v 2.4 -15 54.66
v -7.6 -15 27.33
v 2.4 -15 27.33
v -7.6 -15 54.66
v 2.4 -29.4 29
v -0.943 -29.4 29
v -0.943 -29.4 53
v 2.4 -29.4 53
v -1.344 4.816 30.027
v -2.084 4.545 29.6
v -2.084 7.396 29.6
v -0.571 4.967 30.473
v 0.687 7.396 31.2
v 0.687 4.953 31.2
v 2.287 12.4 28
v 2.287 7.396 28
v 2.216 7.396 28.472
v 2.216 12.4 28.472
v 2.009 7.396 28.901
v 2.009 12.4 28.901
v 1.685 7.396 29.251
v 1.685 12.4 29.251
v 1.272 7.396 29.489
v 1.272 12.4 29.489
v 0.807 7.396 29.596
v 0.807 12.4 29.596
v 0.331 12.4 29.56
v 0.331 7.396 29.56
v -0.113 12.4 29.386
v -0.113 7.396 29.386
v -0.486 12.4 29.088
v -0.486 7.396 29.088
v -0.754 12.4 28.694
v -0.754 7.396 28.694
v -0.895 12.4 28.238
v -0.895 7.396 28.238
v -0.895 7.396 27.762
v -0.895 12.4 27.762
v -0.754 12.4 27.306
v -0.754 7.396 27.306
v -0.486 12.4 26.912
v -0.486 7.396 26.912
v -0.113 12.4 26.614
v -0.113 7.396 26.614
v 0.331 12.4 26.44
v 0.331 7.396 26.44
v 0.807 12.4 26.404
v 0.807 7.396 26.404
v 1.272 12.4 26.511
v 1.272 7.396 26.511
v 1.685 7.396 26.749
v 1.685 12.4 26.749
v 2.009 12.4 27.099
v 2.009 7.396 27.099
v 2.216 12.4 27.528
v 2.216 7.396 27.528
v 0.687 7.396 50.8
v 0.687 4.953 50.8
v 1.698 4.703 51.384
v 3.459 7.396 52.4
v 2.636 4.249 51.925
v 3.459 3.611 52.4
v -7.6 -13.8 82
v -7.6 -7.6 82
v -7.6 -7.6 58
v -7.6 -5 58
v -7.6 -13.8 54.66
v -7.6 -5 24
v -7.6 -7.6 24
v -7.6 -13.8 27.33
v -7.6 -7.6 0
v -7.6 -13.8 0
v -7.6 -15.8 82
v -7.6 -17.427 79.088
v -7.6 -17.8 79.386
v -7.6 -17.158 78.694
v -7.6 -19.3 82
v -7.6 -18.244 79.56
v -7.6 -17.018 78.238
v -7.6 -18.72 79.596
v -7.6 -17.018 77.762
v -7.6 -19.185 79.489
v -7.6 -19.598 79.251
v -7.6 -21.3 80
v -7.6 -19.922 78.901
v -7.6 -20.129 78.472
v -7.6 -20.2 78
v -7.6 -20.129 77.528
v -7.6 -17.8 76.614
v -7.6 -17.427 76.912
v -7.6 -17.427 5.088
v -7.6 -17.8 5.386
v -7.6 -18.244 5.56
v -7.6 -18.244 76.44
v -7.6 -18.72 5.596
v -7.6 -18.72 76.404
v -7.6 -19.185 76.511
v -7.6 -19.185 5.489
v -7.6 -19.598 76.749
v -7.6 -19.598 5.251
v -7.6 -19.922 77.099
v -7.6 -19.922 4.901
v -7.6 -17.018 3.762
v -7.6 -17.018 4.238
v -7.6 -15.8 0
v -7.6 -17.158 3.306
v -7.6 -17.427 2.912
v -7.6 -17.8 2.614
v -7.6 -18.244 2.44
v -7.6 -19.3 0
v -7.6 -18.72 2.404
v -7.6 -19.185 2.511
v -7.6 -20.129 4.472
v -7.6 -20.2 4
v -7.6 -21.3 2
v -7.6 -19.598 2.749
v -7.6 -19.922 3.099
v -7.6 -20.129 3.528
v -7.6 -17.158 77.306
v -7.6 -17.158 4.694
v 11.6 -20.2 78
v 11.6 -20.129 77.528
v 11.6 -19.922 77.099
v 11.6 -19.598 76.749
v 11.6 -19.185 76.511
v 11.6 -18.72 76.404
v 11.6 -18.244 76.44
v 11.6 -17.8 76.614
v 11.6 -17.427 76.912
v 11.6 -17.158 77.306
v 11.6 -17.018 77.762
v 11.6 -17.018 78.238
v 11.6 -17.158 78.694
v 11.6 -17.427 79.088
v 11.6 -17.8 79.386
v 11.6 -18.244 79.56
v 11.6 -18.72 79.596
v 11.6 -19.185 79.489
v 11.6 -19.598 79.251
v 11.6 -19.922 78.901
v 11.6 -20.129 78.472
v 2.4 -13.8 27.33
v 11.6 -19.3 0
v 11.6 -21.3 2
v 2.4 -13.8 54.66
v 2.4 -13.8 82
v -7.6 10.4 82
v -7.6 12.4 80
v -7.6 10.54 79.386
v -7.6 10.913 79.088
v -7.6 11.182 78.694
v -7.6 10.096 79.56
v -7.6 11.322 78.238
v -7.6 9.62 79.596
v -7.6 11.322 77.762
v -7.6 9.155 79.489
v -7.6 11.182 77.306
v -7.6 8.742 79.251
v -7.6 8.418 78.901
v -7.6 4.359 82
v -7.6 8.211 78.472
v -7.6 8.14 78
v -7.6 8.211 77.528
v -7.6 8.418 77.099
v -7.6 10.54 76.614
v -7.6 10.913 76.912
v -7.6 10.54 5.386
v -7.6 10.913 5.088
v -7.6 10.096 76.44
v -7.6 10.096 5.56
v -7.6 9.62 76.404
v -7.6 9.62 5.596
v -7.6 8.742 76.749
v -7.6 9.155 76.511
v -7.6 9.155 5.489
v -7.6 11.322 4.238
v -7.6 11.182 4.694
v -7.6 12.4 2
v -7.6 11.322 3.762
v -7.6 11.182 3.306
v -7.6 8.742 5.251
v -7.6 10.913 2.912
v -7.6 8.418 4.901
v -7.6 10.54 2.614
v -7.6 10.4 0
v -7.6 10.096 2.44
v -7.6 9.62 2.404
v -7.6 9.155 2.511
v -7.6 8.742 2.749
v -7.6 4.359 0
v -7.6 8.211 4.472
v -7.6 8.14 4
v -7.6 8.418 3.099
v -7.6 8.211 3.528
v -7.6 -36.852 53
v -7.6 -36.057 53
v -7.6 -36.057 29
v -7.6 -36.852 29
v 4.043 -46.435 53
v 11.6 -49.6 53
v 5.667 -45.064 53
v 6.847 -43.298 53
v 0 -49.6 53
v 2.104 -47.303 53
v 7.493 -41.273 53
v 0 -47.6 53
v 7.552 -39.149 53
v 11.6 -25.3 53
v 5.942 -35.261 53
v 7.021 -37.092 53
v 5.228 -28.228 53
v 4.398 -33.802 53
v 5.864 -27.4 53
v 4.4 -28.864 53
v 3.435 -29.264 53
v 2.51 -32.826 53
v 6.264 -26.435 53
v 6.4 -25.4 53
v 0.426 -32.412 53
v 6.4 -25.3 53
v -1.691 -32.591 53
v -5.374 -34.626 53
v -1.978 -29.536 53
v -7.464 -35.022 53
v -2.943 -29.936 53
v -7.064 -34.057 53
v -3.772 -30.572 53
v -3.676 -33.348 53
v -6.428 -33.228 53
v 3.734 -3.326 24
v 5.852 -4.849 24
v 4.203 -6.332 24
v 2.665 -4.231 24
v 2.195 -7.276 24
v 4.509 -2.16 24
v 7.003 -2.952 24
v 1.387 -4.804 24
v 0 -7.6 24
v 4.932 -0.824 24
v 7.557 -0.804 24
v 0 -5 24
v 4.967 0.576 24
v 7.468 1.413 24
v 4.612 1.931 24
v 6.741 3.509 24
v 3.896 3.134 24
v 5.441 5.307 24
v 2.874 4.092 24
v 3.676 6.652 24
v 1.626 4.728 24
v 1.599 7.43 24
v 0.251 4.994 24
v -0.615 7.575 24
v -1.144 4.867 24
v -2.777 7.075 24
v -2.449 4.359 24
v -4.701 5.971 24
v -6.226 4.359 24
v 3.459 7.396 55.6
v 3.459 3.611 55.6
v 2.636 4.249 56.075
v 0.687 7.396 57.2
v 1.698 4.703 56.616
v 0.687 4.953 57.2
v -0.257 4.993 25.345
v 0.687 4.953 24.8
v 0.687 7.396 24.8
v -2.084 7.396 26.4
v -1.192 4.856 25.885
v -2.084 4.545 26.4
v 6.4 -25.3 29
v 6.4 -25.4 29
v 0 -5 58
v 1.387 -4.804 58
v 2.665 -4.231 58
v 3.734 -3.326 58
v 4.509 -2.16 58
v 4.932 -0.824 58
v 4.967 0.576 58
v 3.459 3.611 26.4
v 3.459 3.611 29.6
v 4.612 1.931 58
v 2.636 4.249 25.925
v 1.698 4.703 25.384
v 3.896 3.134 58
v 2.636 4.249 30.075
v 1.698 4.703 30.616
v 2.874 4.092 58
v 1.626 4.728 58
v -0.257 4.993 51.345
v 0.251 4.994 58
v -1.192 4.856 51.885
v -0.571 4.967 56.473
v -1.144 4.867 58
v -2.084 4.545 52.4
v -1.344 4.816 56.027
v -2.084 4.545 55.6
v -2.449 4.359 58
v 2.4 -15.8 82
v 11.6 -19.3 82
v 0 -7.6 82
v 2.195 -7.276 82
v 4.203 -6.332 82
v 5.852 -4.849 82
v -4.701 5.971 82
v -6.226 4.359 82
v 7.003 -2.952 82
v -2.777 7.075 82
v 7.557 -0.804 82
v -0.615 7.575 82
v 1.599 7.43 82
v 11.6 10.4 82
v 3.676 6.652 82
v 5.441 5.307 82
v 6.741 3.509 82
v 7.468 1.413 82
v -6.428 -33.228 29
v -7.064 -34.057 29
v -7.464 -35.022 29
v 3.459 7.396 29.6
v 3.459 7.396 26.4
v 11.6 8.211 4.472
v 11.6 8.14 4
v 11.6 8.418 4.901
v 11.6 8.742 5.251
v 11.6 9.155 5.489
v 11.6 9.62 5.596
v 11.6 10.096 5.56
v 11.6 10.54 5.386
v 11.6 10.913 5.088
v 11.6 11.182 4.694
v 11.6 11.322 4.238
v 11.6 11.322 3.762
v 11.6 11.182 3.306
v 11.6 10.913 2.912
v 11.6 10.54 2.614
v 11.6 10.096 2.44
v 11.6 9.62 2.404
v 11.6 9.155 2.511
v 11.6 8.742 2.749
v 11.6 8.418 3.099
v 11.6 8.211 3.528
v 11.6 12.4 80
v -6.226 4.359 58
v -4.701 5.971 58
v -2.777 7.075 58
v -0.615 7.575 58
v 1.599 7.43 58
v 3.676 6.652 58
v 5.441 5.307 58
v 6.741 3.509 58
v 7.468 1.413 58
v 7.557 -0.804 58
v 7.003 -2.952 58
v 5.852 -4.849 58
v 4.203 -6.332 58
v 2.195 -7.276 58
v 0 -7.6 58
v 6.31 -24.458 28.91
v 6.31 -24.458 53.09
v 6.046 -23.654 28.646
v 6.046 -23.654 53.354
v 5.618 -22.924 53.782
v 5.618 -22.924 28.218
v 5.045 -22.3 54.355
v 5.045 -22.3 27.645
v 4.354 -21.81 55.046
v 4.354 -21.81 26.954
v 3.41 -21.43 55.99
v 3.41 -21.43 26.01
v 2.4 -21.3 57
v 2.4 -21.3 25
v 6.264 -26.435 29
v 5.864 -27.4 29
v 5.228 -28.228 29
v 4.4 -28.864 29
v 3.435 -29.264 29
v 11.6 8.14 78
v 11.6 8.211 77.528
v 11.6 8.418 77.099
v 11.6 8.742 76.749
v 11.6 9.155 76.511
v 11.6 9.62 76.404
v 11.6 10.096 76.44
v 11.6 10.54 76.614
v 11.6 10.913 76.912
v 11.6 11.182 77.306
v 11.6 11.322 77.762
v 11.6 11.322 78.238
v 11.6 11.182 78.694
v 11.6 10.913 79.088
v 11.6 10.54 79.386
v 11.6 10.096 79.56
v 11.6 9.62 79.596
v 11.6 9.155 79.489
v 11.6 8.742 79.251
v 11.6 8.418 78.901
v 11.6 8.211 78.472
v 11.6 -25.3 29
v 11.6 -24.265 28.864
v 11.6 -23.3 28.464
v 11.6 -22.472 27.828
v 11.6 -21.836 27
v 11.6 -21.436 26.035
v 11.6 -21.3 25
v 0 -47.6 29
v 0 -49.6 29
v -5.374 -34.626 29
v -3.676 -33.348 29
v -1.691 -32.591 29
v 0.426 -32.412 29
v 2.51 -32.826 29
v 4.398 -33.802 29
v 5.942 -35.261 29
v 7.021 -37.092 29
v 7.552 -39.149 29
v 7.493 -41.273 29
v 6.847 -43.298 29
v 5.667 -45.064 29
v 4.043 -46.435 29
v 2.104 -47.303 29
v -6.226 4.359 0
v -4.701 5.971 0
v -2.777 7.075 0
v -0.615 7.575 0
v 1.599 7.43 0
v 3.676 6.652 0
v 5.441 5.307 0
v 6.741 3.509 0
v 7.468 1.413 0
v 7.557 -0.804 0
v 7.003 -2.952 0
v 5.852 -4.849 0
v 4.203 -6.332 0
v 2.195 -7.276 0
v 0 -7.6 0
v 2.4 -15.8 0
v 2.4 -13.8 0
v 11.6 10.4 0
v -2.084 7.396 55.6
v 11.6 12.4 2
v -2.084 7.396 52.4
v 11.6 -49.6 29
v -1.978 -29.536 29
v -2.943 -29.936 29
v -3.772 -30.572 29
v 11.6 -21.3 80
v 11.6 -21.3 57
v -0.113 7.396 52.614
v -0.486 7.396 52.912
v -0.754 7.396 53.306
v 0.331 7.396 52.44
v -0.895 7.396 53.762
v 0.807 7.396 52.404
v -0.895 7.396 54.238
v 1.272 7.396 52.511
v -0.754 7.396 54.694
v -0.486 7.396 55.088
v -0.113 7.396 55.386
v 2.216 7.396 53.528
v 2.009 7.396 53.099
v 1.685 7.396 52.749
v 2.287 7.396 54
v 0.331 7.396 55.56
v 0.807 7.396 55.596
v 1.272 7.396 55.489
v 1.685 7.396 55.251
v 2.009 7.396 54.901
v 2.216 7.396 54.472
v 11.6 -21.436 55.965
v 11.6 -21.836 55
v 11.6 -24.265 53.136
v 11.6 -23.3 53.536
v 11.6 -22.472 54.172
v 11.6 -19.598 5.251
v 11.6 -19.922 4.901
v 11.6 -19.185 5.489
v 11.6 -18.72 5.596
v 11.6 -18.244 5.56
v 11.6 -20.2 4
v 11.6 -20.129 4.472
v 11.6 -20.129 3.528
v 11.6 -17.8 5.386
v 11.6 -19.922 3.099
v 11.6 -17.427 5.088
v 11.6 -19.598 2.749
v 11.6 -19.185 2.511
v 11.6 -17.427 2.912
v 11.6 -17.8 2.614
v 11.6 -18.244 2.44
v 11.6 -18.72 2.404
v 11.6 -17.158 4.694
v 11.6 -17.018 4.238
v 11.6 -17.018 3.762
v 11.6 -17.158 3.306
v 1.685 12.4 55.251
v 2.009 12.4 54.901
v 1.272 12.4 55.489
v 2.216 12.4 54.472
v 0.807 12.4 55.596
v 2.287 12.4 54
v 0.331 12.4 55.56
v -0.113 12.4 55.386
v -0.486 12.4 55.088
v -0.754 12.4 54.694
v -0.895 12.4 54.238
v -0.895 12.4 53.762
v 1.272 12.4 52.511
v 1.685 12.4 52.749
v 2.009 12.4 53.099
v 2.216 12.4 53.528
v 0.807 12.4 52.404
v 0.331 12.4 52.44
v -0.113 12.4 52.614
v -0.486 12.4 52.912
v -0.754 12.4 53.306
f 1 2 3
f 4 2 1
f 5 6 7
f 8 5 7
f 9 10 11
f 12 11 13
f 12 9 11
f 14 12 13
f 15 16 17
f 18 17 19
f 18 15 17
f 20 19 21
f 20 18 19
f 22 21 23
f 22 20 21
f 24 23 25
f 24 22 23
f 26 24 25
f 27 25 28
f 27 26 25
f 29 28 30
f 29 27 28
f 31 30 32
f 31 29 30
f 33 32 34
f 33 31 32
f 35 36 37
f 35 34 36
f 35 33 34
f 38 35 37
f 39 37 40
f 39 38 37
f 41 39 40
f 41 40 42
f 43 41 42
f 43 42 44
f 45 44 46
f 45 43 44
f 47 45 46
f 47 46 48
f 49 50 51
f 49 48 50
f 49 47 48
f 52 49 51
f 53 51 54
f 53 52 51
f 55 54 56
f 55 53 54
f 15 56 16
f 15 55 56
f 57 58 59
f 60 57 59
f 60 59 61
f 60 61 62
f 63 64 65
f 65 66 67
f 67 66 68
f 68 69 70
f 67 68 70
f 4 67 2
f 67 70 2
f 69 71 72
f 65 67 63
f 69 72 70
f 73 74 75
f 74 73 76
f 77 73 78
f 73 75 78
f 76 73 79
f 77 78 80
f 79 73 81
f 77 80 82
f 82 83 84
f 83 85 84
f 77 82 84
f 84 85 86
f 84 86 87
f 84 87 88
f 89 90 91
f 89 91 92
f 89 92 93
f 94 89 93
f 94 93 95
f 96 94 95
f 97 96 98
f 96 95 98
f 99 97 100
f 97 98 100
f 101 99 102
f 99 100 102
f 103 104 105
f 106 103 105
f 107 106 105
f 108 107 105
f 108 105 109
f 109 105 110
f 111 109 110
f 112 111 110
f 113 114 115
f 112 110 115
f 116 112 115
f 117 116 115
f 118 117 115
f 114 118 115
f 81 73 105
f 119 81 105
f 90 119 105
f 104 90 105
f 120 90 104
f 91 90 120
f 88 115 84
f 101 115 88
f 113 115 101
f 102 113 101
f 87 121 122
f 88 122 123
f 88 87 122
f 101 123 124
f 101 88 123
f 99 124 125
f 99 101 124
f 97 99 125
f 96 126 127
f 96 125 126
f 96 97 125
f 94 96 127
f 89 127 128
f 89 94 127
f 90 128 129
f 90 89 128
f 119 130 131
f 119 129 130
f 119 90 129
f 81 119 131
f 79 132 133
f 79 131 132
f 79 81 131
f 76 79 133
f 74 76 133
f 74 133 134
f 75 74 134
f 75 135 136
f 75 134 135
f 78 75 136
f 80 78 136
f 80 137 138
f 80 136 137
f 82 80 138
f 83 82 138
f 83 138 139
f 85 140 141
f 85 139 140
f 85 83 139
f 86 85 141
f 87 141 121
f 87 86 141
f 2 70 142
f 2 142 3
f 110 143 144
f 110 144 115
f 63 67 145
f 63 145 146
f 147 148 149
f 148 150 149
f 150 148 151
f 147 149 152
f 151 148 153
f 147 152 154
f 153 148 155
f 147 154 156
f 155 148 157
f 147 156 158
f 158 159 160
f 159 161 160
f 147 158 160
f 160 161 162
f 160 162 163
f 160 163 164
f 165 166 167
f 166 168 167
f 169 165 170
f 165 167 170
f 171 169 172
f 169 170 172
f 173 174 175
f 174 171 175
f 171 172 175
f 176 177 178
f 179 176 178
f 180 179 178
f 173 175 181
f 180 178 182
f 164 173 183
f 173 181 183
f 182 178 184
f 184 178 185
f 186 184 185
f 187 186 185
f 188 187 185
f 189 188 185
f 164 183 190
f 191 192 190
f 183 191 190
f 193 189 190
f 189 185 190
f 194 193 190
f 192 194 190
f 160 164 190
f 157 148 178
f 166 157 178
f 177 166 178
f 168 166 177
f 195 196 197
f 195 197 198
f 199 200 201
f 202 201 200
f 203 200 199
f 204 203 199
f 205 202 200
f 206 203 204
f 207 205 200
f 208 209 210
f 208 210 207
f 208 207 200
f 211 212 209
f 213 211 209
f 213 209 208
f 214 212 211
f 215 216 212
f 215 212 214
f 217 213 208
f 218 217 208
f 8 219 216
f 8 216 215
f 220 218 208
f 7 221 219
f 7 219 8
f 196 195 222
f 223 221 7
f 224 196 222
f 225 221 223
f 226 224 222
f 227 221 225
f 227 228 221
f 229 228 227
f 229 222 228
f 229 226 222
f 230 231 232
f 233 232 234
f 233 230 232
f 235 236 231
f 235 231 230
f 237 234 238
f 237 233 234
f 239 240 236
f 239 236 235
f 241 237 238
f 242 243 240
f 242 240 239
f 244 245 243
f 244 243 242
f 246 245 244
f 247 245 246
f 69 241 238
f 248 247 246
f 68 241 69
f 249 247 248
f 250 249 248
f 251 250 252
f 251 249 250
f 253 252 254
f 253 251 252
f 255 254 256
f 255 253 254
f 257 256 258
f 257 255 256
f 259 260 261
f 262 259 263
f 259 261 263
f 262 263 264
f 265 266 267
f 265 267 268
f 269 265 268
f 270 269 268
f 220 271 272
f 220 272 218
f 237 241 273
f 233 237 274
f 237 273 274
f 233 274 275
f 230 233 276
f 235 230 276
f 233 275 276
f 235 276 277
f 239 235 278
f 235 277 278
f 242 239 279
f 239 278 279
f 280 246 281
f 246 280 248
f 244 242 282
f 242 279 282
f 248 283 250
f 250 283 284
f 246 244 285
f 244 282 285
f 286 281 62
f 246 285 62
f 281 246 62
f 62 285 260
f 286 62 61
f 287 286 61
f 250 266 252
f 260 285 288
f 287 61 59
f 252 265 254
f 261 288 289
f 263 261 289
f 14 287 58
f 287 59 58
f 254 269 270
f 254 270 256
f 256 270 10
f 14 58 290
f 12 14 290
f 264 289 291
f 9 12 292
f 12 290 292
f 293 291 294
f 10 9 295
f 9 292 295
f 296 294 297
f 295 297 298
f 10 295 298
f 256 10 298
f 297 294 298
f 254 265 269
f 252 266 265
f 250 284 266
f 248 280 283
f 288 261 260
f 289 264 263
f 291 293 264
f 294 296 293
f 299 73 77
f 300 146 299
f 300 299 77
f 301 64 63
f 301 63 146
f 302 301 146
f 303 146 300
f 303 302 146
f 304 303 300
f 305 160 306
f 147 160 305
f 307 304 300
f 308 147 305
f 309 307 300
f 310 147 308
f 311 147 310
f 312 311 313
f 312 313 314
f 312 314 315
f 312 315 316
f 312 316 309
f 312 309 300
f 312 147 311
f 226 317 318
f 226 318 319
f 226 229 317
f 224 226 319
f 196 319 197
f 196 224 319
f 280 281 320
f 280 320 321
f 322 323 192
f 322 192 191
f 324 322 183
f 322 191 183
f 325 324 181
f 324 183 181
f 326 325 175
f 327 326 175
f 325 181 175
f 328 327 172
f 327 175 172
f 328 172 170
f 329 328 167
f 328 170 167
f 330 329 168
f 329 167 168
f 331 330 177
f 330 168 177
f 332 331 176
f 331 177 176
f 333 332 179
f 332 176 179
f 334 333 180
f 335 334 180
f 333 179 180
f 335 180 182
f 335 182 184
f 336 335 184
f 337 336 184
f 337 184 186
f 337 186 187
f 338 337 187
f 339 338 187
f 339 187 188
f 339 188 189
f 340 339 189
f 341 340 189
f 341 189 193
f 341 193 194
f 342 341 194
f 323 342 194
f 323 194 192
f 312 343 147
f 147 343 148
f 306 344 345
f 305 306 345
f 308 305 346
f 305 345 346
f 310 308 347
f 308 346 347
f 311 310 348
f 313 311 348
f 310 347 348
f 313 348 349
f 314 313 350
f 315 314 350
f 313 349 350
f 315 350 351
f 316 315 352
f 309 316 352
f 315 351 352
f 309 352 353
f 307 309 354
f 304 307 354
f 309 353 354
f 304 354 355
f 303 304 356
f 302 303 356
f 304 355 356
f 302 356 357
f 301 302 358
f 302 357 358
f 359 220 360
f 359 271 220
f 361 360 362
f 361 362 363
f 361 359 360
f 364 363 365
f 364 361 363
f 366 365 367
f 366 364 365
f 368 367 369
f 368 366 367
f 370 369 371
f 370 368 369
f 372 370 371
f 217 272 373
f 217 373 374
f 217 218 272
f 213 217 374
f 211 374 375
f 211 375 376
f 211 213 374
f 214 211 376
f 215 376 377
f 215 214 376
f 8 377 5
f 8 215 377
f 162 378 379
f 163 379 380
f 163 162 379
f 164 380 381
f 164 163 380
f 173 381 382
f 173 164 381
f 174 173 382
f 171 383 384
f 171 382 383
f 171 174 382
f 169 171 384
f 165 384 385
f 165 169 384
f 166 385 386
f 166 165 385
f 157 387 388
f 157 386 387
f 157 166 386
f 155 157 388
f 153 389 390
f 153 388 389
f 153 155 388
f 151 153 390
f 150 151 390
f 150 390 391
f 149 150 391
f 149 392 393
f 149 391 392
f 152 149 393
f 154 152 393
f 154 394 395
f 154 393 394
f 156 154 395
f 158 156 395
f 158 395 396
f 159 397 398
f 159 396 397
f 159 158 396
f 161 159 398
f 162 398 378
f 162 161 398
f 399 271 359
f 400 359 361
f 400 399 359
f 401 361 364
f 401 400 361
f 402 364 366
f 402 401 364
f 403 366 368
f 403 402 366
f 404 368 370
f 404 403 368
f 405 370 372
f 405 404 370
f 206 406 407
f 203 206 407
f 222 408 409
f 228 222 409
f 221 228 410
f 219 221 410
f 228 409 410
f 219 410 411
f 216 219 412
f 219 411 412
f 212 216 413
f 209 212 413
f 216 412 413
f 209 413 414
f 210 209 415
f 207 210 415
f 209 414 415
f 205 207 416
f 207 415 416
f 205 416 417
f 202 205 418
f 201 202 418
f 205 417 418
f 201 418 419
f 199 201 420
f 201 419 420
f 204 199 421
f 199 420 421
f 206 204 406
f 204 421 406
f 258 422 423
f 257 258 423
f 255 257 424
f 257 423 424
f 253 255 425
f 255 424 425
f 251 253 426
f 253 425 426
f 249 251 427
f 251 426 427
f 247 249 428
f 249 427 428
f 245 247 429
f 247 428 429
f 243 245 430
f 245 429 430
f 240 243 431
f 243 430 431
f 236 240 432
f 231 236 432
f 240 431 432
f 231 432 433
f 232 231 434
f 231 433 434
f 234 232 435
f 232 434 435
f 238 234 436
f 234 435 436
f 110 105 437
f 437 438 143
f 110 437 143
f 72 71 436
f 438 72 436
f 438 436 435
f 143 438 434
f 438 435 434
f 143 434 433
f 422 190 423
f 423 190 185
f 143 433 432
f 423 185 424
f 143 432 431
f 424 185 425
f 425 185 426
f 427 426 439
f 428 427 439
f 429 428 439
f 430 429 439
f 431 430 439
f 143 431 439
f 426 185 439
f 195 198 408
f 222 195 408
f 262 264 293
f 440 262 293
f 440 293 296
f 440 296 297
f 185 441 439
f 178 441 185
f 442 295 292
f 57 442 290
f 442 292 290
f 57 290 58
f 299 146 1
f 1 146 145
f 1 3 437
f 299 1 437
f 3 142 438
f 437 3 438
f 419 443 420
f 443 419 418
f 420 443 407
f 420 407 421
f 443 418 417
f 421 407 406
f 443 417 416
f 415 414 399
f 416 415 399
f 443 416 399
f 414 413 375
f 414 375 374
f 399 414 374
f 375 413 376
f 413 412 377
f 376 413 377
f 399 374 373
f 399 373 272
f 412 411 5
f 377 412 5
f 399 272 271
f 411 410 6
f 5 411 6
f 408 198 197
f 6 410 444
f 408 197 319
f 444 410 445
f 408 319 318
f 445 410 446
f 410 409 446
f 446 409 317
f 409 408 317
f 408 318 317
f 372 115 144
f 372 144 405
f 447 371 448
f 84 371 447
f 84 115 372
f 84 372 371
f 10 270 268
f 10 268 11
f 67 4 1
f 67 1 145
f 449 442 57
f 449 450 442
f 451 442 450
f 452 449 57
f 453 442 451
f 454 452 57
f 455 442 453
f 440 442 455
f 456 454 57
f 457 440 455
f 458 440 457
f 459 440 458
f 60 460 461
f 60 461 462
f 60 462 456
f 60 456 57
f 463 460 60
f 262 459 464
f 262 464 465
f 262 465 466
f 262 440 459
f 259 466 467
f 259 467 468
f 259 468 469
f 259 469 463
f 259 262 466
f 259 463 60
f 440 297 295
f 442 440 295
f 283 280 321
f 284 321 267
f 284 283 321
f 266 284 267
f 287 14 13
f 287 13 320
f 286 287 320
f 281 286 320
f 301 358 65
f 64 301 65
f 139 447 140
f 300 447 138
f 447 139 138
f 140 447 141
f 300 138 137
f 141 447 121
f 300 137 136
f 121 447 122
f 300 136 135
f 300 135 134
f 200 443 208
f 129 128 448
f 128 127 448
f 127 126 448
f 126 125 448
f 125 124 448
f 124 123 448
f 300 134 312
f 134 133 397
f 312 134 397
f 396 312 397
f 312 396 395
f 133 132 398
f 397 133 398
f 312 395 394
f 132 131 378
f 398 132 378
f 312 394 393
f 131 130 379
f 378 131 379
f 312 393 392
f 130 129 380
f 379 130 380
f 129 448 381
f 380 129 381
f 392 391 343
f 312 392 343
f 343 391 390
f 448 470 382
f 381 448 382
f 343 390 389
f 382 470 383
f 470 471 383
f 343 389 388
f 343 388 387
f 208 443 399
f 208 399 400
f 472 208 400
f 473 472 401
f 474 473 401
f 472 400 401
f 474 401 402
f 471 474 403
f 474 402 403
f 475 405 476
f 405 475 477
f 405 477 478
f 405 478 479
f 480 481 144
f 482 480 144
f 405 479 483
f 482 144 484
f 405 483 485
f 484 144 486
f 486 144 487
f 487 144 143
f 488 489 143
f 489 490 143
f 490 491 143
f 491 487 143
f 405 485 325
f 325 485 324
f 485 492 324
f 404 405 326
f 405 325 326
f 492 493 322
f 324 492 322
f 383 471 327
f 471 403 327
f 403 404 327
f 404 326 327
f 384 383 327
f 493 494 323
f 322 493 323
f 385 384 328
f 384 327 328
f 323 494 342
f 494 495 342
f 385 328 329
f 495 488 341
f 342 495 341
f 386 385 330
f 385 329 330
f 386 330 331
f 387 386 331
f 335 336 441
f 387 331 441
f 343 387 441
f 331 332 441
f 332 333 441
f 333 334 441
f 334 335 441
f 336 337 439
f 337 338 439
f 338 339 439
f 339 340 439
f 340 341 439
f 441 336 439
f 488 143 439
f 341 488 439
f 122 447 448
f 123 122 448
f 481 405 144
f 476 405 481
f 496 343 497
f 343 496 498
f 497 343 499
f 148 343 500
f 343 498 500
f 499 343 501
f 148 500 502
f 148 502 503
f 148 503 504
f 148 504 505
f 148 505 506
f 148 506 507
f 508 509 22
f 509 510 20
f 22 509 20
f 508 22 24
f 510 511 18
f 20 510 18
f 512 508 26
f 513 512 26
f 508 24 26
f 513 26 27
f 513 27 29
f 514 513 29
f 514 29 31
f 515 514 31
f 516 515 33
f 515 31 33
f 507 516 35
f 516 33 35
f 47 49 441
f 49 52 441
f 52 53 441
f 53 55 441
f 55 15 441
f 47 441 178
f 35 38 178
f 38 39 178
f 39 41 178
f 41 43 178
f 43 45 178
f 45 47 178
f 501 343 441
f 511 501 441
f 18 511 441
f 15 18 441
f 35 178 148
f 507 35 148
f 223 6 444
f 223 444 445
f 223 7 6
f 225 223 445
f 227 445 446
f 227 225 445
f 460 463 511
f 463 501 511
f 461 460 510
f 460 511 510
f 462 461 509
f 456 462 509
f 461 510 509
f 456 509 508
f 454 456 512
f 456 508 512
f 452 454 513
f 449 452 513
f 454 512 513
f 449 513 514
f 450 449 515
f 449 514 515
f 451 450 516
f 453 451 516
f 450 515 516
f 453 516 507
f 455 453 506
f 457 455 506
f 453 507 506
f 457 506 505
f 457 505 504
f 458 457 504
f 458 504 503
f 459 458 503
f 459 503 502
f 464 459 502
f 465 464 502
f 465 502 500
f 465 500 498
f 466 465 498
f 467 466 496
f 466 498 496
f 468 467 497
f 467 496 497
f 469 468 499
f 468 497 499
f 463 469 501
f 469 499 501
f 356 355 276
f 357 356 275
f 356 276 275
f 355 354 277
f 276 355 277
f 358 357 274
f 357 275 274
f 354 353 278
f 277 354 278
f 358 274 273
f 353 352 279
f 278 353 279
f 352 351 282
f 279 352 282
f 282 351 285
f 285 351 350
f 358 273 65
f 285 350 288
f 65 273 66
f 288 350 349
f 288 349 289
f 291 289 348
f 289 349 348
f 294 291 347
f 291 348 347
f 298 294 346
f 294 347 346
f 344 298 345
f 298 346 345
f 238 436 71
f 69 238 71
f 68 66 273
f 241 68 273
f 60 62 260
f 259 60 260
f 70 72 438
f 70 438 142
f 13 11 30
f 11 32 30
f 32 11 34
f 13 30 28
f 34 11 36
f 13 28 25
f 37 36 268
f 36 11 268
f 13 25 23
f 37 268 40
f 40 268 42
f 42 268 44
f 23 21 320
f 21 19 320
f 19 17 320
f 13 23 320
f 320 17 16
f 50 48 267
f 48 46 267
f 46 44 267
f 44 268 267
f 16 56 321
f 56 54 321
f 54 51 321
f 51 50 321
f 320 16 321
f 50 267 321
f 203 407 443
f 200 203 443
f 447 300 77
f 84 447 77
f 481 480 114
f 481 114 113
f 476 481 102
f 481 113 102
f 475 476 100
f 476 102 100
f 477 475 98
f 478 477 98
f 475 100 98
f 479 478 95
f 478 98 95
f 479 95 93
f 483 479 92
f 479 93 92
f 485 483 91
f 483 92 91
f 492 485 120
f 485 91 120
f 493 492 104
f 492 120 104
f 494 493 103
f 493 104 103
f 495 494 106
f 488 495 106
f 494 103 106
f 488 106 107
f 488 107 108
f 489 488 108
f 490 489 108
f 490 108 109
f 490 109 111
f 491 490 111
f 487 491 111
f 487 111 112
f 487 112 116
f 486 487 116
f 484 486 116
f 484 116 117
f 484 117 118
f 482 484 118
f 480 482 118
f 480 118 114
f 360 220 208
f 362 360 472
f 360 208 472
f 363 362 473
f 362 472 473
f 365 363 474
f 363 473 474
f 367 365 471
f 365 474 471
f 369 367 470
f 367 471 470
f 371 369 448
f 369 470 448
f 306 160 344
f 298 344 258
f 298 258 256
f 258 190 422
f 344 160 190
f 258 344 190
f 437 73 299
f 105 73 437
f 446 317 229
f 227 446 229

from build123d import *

# Parameters (mm, degrees)
BOSS_EXTRUDE1_DEPTH      = 82
BOSS_EXTRUDE2_DEPTH      = 17
BOSS_EXTRUDE2_DEPTH_BACK = 17
CUT_EXTRUDE1_DEPTH       = 10
SKETCH6_R                = 1.6
CUT_EXTRUDE2_DEPTH       = 98.738426425
CUT_EXTRUDE3_DEPTH       = 14
CHAMFER1_SIZE            = 2
SKETCH9_W                = 29
SKETCH9_H                = 28.3
CUT_EXTRUDE4_DEPTH       = 98.738426425
FILLET1_R                = 4
FILLET2_R                = 4
CHAMFER2_SIZE            = 2
CHAMFER3_SIZE            = 5
FILLET3_R                = 4
CUT_EXTRUDE5_REACH       = 109.79
CUT_EXTRUDE5_START       = -10.003729205
SKETCH11_R               = 1.6
CUT_EXTRUDE6_DEPTH       = 5


with BuildPart() as part:
    # Sketch1 → Boss-Extrude1 (new body)
    with BuildSketch(Plane.XY):
        with BuildLine():
            Line((0, -47.6), (0, -49.6))
            Line((0, -49.6), (11.6, -49.6))
            Line((11.6, -49.6), (11.6, 12.4))
            Line((11.6, 12.4), (-7.6, 12.4))
            Line((-7.6, 12.4), (-7.6, 4.359180916))
            Line((-7.6, 4.359180916), (-6.225555537, 4.359180916))
            ThreePointArc((-6.225555537, 4.359180916), (6.741282332, 3.509289461), (0, -7.6))
            Line((0, -7.6), (-7.6, -7.6))
            Line((-7.6, -7.6), (-7.6, -9.6))
            Line((-7.6, -9.6), (-7.6, -18.625988463))
            Line((-7.6, -18.625988463), (-7.6, -36.851976926))
            Line((-7.6, -36.851976926), (-5.374011537, -34.625988463))
            ThreePointArc((-5.374011537, -34.625988463), (7.021484447, -37.091605914), (0, -47.6))
        make_face()
    extrude(amount=BOSS_EXTRUDE1_DEPTH)

    # Sketch2 → Boss-Extrude2 (add, two sides: drawn at the far end of the back side and taken through both)
    with BuildSketch(Plane(origin=(0, 0, 41), x_dir=(-1, 0, 0), z_dir=(0, 0, -1)).offset(-BOSS_EXTRUDE2_DEPTH_BACK)):
        with BuildLine():
            Line((0, -7.6), (7.6, -7.6))
            Line((7.6, -7.6), (7.6, -5))
            Line((7.6, -5), (0, -5))
            ThreePointArc((0, -5), (-4.837142988, 1.265720233), (2.448987901, 4.359180916))
            Line((2.448987901, 4.359180916), (6.225555537, 4.359180916))
            ThreePointArc((6.225555537, 4.359180916), (-6.741282332, 3.509289461), (0, -7.6))
        make_face()
    extrude(amount=BOSS_EXTRUDE2_DEPTH + BOSS_EXTRUDE2_DEPTH_BACK)

    # Sketch4 → Cut-Extrude1 (cut)
    with BuildSketch(Plane.ZY.offset(7.6)):
        Polygon((82, -13.8), (54.66, -13.8), (54.66, -15), (27.33, -15), (27.33, -13.8), (0, -13.8), (0, -15.8), (82, -15.8), align=None)
    extrude(amount=-CUT_EXTRUDE1_DEPTH, mode=Mode.SUBTRACT)

    # Sketch6 → Cut-Extrude2 (cut, through all)
    with BuildSketch(Plane.ZY.offset(7.6)):
        with Locations((4, 9.74)):
            Circle(SKETCH6_R)
        with Locations((4, -18.6)):
            Circle(SKETCH6_R)
    cut_extrude2 = extrude(amount=-CUT_EXTRUDE2_DEPTH, mode=Mode.SUBTRACT)

    # Mirror1: Cut-Extrude2 across plane
    add(cut_extrude2.mirror(Plane(origin=(0, 0, 41), x_dir=(1, 0, 0), z_dir=(0, 0, -1))), mode=Mode.SUBTRACT)

    # Sketch7 → Cut-Extrude3 (cut)
    with BuildSketch(Plane.ZY.offset(7.6)):
        Polygon((0, -29.4), (82, -29.4), (82, -21.3), (74, -21.3), (8, -21.3), (0, -21.3), align=None)
    extrude(amount=-CUT_EXTRUDE3_DEPTH, mode=Mode.SUBTRACT)

    # Chamfer1
    chamfer1_edges = [part.edges().sort_by_distance(p)[0] for p in [
        (2, 12.4, 82),
        (2, 12.4, 0),
    ]]
    chamfer(chamfer1_edges, length=CHAMFER1_SIZE)

    # Sketch9 → Cut-Extrude4 (cut, through all)
    with BuildSketch(Plane.ZY.offset(7.6)):
        with Locations((67.5, -35.45)):
            Rectangle(SKETCH9_W, SKETCH9_H)
        with Locations((14.5, -35.45)):
            Rectangle(SKETCH9_W, SKETCH9_H)
    extrude(amount=-CUT_EXTRUDE4_DEPTH, mode=Mode.SUBTRACT)

    # Fillet1
    fillet1_edges = [part.edges().sort_by_distance(p)[0] for p in [
        (6.4, -29.4, 41),
        (6.4, -21.3, 41),
    ]]
    fillet(fillet1_edges, radius=FILLET1_R)

    # Fillet2
    fillet2_edges = [part.edges().sort_by_distance(p)[0] for p in [
        (7, -21.3, 53),
        (7, -21.3, 29),
    ]]
    fillet(fillet2_edges, radius=FILLET2_R)

    # Chamfer2
    chamfer2_edges = [part.edges().sort_by_distance(p)[0] for p in [
        (2, -21.3, 82),
        (2, -21.3, 0),
    ]]
    chamfer(chamfer2_edges, length=CHAMFER2_SIZE)

    # Chamfer3
    chamfer3_edges = [part.edges().sort_by_distance(p)[0] for p in [
        (-7.6, -29.4, 41),
    ]]
    chamfer(chamfer3_edges, length=CHAMFER3_SIZE)

    # Fillet3
    fillet3_edges = [part.edges().sort_by_distance(p)[0] for p in [
        (-7.6, -34.4, 41),
        (-2.6, -29.4, 41),
    ]]
    fillet(fillet3_edges, radius=FILLET3_R)

    # Sketch11 → Cut-Extrude5 (cut, up to next)
    with BuildSketch(Plane.XZ.offset(-2.396270795).offset(CUT_EXTRUDE5_START), mode=Mode.PRIVATE) as cut_extrude5_sk1:
        with Locations((0.687222232, 54)):
            Circle(SKETCH11_R)
    cut_extrude5_tool1 = extrude(cut_extrude5_sk1.sketch, amount=CUT_EXTRUDE5_REACH, mode=Mode.PRIVATE) & part.part
    cut_extrude5 = cut_extrude5_tool1.solids().sort_by_distance((0.687222, 12.4, 54))[0]
    add(cut_extrude5, mode=Mode.SUBTRACT)

    # Mirror2: Cut-Extrude5 across plane
    add(cut_extrude5.mirror(Plane(origin=(0, 0, 41), x_dir=(1, 0, 0), z_dir=(0, 0, -1))), mode=Mode.SUBTRACT)

    # Sketch12 → Cut-Extrude6 (cut)
    with BuildSketch(Plane.XZ.offset(-2.396270795)):
        Polygon((-2.08405906, 52.4), (0.687222232, 50.8), (3.458503524, 52.4), (3.458503524, 55.6), (0.687222232, 57.2), (-2.08405906, 55.6), align=None)
    cut_extrude6 = extrude(amount=-CUT_EXTRUDE6_DEPTH, mode=Mode.SUBTRACT)

    # Mirror3: Cut-Extrude6 across plane
    add(cut_extrude6.mirror(Plane(origin=(0, 0, 41), x_dir=(1, 0, 0), z_dir=(0, 0, -1))), mode=Mode.SUBTRACT)


solid = part.part
